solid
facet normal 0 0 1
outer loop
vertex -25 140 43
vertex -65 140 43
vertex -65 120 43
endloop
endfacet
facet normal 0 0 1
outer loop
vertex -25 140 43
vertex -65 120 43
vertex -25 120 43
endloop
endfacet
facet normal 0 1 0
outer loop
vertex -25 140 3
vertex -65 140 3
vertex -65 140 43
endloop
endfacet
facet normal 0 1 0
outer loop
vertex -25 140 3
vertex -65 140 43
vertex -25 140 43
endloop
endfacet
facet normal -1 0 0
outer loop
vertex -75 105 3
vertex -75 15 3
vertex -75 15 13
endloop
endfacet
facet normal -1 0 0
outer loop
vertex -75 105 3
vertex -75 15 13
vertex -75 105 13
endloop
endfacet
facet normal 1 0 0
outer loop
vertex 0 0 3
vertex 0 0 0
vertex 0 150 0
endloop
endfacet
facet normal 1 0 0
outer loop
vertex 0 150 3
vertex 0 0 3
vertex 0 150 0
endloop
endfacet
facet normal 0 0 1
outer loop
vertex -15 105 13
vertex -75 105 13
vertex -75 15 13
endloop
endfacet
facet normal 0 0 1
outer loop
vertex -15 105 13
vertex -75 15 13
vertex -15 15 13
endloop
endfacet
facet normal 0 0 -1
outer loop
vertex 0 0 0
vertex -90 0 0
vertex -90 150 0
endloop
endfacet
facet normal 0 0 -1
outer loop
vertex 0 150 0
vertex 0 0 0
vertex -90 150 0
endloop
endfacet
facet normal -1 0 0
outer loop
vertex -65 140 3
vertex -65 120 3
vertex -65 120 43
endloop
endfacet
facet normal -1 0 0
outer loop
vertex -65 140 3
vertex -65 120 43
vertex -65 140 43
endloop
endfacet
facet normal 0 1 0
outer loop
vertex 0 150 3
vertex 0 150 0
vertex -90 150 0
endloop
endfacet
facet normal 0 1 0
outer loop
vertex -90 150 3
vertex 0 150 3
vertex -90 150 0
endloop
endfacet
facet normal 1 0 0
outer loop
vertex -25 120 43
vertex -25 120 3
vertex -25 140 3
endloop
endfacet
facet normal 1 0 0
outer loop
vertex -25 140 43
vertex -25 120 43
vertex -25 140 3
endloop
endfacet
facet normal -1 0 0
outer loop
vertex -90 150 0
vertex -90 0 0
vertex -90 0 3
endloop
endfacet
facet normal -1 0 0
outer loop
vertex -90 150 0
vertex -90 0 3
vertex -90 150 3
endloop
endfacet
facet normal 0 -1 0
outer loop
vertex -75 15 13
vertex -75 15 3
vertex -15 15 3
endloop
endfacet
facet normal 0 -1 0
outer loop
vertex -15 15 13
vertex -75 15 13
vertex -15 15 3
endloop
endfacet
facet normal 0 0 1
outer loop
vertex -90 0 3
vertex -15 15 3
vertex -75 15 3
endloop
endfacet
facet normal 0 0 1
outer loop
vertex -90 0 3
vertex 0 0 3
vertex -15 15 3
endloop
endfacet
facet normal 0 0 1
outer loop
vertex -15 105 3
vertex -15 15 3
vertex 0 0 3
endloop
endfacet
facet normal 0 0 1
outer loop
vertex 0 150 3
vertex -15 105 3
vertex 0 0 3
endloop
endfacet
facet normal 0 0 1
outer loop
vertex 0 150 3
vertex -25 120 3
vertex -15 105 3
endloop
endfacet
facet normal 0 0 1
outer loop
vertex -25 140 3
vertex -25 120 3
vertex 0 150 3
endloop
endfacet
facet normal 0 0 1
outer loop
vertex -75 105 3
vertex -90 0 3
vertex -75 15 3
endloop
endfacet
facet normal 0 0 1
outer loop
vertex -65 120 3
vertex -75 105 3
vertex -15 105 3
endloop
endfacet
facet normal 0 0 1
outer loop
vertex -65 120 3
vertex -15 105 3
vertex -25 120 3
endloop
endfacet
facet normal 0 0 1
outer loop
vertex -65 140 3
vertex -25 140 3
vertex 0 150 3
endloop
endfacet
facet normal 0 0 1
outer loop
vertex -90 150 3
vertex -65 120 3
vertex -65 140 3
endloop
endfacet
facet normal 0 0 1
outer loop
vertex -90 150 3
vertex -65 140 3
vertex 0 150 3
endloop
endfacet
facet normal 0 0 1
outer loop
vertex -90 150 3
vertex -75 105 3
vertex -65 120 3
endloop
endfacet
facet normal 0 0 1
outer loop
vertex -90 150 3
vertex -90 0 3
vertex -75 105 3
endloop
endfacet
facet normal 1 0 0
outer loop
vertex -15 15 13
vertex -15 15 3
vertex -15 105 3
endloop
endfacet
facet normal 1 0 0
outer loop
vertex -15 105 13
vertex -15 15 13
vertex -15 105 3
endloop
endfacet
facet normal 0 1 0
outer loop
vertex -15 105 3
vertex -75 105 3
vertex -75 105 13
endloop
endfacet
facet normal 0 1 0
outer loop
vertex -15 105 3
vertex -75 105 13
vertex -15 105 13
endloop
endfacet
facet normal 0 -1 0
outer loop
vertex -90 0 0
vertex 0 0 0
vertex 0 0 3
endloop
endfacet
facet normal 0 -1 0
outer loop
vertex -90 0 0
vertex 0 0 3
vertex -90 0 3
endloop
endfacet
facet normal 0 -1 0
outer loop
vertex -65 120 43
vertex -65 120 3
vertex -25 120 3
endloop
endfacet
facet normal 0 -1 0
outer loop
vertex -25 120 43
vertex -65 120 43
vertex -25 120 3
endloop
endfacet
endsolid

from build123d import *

# Parameters (mm, degrees)
SKETCH2_W           = 150
SKETCH2_H           = 90
BOSS_EXTRUDE1_DEPTH = 3
SKETCH3_W           = 60
SKETCH3_H           = 90
BOSS_EXTRUDE2_DEPTH = 10
SKETCH4_W           = 40
SKETCH4_H           = 20
BOSS_EXTRUDE3_DEPTH = 40


with BuildPart() as part:
    # Sketch2 → Boss-Extrude1 (new body)
    with BuildSketch(Plane(origin=(0, 0, 0), x_dir=(0, 1, 0), z_dir=(0, 0, 1))):
        with Locations((75, 45)):
            Rectangle(SKETCH2_W, SKETCH2_H)
    extrude(amount=BOSS_EXTRUDE1_DEPTH)

    # Sketch3 → Boss-Extrude2 (add)
    with BuildSketch(Plane.XY.offset(3)):
        with Locations((-45, 60)):
            Rectangle(SKETCH3_W, SKETCH3_H)
    extrude(amount=BOSS_EXTRUDE2_DEPTH)

    # Sketch4 → Boss-Extrude3 (add)
    with BuildSketch(Plane.XY.offset(3)):
        with Locations((-45, 130)):
            Rectangle(SKETCH4_W, SKETCH4_H)
    extrude(amount=BOSS_EXTRUDE3_DEPTH)


solid = part.part
